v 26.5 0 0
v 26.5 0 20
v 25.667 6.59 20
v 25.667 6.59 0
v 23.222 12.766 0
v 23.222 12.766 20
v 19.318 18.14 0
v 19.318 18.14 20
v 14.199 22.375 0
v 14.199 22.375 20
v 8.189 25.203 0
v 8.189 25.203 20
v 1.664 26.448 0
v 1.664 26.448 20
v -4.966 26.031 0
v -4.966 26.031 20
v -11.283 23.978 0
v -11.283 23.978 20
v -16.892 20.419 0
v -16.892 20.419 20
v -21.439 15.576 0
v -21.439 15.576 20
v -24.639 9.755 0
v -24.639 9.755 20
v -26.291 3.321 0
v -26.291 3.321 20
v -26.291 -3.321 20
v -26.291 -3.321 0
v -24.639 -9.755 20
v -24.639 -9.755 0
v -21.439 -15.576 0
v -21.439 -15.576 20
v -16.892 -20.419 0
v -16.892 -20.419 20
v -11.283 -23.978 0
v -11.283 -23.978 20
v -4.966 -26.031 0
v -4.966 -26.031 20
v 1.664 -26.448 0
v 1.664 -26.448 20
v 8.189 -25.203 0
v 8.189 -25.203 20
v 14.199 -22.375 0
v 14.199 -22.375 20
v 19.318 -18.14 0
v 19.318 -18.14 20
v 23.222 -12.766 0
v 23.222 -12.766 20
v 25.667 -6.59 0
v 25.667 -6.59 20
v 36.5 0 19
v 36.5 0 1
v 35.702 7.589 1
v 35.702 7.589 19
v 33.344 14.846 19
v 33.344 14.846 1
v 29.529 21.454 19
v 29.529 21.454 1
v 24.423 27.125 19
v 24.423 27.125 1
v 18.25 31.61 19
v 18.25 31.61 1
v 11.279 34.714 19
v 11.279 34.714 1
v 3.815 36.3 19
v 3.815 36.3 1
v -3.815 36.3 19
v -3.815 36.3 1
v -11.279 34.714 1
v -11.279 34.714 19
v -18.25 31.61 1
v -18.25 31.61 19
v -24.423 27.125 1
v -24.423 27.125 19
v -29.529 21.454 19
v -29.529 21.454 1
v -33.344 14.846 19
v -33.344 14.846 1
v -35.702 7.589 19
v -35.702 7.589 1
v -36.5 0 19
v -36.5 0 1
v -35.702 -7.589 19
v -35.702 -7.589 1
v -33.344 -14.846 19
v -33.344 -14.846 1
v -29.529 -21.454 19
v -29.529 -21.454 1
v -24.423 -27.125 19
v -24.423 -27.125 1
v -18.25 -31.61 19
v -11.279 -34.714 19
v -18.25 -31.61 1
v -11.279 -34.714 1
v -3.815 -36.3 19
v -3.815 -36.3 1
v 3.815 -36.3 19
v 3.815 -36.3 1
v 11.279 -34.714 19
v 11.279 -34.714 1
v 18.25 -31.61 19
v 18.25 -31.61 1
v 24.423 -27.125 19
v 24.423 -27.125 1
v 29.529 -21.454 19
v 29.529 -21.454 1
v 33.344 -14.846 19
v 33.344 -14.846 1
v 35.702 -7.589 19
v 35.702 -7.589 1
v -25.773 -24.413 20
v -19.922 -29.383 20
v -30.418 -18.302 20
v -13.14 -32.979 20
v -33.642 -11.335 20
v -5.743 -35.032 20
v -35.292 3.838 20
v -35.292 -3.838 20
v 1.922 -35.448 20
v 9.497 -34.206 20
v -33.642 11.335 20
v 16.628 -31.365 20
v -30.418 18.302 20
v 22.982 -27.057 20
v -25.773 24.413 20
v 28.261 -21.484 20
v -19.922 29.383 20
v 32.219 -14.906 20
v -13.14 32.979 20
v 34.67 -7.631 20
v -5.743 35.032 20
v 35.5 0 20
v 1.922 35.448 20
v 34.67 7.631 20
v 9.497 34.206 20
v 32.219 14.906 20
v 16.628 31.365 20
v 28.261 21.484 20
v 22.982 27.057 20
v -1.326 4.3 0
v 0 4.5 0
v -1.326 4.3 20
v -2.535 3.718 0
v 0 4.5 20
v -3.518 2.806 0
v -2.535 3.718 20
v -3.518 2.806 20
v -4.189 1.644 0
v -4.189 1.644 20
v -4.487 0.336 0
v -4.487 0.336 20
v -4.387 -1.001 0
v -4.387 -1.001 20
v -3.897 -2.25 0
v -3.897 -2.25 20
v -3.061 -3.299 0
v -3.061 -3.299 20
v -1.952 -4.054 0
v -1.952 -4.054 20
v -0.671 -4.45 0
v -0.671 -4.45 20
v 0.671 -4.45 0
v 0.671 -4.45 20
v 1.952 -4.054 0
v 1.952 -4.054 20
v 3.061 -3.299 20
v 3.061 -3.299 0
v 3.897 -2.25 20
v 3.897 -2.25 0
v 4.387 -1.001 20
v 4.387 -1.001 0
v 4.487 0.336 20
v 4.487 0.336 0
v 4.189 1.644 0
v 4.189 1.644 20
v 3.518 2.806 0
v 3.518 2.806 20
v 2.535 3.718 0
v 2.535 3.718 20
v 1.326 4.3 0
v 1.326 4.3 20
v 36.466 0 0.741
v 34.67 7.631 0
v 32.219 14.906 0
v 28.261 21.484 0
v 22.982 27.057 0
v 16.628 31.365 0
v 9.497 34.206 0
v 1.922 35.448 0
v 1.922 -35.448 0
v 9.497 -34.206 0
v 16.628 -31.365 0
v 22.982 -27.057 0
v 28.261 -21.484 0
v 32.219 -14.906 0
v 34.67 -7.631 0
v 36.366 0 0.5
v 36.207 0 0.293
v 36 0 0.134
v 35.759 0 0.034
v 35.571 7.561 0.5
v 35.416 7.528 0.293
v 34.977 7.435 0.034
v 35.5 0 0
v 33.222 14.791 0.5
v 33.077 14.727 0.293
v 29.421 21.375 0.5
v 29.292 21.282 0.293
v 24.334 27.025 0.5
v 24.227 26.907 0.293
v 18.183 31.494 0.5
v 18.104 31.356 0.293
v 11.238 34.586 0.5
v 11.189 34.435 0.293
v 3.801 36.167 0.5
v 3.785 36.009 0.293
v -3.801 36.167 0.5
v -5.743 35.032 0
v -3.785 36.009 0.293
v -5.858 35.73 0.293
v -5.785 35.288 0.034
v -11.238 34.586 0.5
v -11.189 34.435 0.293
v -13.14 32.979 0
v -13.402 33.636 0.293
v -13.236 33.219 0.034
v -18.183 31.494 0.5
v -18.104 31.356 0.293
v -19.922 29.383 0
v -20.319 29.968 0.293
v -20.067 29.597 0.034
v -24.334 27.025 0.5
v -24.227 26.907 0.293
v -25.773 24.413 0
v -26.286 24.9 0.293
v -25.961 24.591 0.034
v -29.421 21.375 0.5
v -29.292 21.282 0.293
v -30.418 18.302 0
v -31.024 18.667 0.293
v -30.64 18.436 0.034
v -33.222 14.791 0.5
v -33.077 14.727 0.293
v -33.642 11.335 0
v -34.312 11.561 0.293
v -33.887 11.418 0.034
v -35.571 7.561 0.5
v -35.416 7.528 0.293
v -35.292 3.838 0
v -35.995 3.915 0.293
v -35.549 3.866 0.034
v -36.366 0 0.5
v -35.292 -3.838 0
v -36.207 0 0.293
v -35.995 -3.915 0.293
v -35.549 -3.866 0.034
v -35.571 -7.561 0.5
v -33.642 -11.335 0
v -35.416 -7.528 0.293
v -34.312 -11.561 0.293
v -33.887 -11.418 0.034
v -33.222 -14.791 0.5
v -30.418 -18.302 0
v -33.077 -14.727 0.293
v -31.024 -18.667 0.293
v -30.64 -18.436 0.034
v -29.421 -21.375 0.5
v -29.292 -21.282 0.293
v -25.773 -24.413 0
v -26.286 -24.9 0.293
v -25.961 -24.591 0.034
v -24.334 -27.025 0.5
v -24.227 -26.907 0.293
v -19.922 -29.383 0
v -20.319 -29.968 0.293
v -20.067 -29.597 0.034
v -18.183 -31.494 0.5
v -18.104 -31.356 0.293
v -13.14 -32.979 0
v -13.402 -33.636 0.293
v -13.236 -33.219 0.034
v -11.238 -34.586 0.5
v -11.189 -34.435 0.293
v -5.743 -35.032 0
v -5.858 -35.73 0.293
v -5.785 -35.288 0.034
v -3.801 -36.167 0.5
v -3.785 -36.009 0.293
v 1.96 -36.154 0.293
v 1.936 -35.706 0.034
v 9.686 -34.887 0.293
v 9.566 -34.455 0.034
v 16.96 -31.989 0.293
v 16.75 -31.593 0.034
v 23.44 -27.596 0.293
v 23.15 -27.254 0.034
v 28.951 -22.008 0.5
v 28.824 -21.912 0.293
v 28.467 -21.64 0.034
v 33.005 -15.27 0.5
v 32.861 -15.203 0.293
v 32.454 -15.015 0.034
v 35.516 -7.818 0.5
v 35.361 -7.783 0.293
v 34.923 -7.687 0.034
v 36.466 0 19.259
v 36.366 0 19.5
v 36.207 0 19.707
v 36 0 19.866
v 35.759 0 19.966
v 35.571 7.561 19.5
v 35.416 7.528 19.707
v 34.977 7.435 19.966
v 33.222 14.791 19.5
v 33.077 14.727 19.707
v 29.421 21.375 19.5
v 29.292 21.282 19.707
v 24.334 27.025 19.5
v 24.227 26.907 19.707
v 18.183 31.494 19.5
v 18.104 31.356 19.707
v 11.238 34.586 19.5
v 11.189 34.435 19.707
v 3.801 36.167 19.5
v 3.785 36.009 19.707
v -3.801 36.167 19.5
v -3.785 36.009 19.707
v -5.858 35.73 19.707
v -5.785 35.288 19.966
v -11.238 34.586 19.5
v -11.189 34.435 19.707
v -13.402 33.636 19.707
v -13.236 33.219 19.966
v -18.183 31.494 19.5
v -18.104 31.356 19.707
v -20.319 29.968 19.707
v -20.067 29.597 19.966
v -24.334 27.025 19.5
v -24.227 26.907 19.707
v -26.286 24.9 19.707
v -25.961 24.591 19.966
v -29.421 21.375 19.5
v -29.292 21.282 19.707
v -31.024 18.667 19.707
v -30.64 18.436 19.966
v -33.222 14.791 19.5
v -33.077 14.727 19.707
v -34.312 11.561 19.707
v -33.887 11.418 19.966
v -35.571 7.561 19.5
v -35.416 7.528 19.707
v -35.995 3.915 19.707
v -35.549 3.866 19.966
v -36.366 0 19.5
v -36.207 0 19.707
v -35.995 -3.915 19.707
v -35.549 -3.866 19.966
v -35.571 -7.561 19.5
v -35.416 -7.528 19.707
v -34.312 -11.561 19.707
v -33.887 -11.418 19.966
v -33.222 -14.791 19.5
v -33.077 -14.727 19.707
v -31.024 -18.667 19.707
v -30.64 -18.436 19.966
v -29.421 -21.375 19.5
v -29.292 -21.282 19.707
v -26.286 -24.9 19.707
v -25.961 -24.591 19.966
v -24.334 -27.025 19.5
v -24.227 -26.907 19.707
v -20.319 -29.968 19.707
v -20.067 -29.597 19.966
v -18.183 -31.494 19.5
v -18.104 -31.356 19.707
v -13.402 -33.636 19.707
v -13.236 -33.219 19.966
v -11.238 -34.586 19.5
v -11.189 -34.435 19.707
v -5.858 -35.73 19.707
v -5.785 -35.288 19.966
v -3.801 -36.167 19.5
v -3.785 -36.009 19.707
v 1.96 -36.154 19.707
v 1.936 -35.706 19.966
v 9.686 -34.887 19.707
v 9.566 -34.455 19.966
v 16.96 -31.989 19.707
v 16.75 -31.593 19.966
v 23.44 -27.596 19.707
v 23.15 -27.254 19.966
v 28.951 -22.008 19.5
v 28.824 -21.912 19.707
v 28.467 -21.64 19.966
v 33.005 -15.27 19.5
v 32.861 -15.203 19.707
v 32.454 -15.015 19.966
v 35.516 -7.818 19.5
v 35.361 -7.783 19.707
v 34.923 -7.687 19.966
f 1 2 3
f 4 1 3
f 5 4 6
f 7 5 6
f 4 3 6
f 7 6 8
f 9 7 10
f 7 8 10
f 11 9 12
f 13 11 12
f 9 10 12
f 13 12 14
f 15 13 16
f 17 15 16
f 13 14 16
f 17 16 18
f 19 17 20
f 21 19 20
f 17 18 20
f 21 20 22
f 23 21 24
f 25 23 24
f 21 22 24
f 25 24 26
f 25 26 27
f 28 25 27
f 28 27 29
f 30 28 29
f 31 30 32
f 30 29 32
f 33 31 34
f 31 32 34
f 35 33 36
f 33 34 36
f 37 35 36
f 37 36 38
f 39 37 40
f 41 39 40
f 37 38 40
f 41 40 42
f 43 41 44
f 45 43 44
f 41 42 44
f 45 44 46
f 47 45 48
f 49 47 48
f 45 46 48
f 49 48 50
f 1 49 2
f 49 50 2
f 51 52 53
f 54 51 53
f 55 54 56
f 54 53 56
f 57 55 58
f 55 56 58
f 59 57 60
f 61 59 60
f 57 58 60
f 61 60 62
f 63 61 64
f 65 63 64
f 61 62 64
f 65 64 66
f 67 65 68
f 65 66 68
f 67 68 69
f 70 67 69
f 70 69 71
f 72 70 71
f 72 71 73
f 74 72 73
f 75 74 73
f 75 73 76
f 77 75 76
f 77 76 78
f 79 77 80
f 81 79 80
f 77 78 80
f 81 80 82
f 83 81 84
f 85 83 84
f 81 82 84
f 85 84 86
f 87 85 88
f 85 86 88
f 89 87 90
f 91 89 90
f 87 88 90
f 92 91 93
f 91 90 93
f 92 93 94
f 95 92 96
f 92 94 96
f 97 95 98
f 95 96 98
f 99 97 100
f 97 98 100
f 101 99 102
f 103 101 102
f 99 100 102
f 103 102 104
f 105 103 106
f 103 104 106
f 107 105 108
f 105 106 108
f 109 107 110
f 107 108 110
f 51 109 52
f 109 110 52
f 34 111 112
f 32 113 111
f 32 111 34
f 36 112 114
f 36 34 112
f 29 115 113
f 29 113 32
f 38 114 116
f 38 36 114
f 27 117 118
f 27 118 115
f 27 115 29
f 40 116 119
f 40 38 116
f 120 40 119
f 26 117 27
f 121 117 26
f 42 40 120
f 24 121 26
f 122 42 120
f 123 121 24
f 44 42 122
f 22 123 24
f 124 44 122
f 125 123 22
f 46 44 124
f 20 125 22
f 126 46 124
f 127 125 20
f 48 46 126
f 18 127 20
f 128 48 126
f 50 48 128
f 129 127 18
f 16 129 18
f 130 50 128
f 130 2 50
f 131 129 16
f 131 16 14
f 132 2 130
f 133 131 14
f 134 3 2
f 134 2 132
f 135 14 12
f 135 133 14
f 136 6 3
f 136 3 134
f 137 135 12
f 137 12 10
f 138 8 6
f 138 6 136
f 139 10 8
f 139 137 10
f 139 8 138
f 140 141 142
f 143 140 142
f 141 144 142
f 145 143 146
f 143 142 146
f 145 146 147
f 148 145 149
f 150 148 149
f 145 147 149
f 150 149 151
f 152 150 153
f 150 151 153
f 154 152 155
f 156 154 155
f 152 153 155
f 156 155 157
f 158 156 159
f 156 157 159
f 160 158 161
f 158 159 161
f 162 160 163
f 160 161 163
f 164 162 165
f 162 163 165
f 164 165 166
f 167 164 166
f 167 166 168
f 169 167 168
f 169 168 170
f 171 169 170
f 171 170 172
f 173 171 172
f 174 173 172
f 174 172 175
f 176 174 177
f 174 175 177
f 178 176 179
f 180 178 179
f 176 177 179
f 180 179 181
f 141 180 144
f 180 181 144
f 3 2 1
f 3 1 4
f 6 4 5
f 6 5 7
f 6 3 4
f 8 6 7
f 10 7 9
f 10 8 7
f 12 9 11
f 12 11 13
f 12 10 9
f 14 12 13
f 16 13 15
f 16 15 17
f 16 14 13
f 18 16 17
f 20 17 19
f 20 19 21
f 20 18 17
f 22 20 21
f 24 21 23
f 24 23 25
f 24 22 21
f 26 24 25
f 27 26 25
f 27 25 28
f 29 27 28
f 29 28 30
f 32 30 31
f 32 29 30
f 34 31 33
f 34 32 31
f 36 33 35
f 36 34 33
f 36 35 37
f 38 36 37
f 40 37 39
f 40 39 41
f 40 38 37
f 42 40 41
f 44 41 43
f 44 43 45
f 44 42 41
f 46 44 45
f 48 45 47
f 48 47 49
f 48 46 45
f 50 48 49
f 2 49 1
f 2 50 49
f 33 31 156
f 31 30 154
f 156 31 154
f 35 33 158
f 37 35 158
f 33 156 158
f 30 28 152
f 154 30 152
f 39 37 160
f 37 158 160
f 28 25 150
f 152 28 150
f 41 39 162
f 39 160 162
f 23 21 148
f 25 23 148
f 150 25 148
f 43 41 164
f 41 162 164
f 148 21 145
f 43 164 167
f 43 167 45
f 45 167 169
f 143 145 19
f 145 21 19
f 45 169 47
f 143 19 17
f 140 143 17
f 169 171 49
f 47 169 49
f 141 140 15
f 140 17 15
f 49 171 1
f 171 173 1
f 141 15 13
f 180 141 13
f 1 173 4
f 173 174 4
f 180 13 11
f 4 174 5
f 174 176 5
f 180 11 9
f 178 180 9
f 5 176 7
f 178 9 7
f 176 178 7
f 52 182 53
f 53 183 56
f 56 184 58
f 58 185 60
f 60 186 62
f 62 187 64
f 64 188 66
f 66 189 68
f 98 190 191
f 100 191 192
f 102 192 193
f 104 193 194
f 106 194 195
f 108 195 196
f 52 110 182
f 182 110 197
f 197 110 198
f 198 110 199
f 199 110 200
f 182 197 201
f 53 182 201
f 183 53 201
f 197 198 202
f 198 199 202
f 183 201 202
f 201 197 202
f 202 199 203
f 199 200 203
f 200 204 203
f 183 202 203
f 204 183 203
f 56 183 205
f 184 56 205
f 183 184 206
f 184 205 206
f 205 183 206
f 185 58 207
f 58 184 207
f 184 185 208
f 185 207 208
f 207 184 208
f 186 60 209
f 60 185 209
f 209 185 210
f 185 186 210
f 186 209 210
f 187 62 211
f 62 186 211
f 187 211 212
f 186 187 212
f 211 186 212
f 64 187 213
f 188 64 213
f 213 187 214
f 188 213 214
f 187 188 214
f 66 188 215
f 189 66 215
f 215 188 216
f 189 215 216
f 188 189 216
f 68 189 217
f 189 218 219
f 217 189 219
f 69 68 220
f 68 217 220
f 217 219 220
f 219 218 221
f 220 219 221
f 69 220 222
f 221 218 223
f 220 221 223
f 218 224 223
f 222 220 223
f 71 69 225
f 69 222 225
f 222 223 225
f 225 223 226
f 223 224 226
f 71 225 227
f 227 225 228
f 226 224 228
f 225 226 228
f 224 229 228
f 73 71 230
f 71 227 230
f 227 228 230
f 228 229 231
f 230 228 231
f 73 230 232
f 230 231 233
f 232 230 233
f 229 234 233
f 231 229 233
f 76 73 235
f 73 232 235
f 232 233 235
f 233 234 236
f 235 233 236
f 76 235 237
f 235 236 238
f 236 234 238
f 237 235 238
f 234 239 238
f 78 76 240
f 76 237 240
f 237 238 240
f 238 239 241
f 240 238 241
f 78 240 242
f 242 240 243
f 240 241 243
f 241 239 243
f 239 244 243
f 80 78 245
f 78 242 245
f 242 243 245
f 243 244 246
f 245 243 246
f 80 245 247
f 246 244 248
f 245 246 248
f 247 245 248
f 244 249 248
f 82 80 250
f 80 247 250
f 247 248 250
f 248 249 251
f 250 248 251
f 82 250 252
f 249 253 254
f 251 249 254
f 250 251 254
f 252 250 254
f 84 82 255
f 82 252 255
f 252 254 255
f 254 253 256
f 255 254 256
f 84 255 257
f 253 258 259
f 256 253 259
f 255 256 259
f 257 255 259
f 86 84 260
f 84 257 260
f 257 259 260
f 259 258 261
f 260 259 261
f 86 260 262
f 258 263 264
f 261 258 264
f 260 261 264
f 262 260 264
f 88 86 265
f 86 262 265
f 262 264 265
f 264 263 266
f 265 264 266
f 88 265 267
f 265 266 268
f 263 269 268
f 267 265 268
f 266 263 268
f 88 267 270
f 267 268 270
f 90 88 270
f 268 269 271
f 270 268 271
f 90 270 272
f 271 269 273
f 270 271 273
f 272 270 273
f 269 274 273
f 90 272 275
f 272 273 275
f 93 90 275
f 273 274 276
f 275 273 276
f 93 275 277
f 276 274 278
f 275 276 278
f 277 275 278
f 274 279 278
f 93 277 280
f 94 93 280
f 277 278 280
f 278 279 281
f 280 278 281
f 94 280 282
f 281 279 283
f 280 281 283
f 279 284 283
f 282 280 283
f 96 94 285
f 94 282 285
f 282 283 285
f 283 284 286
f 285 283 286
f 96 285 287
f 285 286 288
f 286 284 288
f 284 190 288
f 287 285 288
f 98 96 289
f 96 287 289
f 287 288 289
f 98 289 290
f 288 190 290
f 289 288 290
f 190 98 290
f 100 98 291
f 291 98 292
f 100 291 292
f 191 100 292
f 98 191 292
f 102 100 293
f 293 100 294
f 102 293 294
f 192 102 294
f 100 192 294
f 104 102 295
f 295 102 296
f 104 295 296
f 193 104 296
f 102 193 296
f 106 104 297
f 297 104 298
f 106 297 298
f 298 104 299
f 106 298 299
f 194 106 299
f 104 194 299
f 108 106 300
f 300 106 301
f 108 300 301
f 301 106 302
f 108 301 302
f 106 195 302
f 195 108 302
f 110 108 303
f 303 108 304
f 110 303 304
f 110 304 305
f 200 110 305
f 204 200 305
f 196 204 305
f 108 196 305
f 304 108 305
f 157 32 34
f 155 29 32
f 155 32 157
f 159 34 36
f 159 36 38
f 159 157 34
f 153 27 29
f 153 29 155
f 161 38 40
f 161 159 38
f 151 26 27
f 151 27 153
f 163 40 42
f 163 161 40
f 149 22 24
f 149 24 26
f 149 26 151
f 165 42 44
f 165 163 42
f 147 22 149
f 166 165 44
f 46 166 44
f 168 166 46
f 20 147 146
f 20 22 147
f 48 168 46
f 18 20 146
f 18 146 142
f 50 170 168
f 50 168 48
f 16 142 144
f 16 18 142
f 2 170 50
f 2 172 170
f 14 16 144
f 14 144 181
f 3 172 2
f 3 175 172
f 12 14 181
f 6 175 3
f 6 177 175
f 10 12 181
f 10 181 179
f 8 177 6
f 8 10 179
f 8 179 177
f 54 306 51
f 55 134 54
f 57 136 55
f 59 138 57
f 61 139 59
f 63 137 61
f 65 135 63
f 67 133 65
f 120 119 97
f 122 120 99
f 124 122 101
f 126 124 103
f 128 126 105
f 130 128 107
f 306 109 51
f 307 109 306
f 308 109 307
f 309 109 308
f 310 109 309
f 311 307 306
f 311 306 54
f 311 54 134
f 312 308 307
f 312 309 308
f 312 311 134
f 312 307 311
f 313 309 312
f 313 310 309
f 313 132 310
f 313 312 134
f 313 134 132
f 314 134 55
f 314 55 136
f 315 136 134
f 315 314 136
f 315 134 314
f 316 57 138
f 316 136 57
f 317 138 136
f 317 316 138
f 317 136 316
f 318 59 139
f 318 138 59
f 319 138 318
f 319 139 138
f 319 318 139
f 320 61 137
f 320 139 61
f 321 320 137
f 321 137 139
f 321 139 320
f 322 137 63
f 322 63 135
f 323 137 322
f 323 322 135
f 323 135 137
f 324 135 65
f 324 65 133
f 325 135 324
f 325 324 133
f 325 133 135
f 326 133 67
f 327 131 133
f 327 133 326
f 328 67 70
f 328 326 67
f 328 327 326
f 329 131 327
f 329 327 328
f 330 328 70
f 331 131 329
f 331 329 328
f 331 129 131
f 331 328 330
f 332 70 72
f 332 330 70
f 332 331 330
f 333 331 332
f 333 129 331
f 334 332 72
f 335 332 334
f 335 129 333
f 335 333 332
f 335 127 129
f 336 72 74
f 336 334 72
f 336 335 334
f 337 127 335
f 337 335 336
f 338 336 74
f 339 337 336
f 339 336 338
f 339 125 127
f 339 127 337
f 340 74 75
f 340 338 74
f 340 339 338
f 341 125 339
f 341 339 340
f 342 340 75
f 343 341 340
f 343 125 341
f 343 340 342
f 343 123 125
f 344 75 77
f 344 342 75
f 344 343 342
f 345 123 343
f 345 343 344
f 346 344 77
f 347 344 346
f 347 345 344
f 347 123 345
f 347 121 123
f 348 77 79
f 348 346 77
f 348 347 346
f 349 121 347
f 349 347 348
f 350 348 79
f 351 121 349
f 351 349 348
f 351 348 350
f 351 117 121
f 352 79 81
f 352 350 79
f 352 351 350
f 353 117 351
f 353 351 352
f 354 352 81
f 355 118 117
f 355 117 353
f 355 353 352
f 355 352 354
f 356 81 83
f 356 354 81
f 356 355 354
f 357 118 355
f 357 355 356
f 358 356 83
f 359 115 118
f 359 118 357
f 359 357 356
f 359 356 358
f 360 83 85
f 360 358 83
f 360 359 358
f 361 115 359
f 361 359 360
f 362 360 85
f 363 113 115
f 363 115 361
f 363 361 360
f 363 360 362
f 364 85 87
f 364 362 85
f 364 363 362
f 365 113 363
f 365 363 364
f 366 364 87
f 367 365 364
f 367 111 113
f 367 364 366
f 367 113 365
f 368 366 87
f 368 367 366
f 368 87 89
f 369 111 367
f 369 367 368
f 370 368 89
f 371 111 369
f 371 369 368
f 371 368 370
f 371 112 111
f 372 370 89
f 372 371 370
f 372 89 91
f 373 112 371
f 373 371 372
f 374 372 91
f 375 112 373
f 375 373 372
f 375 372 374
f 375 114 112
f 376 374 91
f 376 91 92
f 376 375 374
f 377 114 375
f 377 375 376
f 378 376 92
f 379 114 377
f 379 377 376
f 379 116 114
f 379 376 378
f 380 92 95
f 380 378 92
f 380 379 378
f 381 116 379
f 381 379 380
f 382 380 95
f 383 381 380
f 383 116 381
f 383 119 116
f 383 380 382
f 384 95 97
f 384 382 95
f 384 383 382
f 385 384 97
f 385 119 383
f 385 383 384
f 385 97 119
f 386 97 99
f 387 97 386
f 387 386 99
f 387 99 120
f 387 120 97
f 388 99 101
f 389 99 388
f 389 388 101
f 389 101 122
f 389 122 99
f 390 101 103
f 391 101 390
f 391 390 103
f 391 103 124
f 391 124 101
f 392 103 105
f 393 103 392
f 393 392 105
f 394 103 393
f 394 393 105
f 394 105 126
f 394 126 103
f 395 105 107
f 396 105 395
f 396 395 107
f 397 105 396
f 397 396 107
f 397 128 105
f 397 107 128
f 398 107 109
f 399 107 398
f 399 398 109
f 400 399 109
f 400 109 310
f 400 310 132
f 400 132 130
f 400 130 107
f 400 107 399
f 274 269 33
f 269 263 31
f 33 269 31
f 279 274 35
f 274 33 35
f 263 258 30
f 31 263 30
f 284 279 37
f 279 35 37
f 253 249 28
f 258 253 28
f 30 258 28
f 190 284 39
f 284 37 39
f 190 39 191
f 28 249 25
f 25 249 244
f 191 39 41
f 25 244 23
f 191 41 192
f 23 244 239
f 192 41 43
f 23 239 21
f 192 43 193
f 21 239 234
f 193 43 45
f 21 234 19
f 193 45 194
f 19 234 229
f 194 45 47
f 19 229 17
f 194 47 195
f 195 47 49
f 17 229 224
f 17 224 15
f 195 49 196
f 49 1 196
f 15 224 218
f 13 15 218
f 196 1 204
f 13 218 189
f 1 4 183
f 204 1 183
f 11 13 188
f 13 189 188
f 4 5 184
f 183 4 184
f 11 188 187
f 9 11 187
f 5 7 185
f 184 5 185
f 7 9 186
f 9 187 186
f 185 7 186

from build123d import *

# Parameters (mm, degrees)
ESQUISSE1_R             = 36.5
BOSS_EXTRU_1_DEPTH      = 20
ESQUISSE2_R             = 26.5
ENL_V_MAT_EXTRU_2_DEPTH = 20
ESQUISSE4_R             = 26.5
BOSS_EXTRU_3_DEPTH      = 20
ESQUISSE9_W             = 4.5
ESQUISSE9_H             = 20
CONG_1_R                = 1


with BuildPart() as part:
    # Esquisse1 → Boss.-Extru.1 (new body)
    with BuildSketch(Plane.XY):
        Circle(ESQUISSE1_R)
    extrude(amount=BOSS_EXTRU_1_DEPTH)

    # Esquisse2 → Enlèv. mat.-Extru.2 (cut)
    with BuildSketch(Plane.XY.offset(20)):
        Circle(ESQUISSE2_R)
    extrude(amount=-ENL_V_MAT_EXTRU_2_DEPTH, mode=Mode.SUBTRACT)

    # Congé1
    cong_1_edges = [part.edges().sort_by_distance(p)[0] for p in [
        (-36.5, 0, 0),
        (-36.5, 0, 20),
    ]]
    fillet(cong_1_edges, radius=CONG_1_R)


with BuildPart() as body_2:
    # Esquisse4 → Boss.-Extru.3 (new body)
    with BuildSketch(Plane.XY.offset(20)):
        Circle(ESQUISSE4_R)
    extrude(amount=-BOSS_EXTRU_3_DEPTH)

    # Esquisse9 → Dégagement M81 (revolve, cut)
    with BuildSketch(Plane.YZ):
        with Locations((2.25, 10)):
            Rectangle(ESQUISSE9_W, ESQUISSE9_H)
    revolve(axis=Axis((0, 0, -6.35), (0, 0, 1)), mode=Mode.SUBTRACT)


solid = Compound([part.part, body_2.part])
